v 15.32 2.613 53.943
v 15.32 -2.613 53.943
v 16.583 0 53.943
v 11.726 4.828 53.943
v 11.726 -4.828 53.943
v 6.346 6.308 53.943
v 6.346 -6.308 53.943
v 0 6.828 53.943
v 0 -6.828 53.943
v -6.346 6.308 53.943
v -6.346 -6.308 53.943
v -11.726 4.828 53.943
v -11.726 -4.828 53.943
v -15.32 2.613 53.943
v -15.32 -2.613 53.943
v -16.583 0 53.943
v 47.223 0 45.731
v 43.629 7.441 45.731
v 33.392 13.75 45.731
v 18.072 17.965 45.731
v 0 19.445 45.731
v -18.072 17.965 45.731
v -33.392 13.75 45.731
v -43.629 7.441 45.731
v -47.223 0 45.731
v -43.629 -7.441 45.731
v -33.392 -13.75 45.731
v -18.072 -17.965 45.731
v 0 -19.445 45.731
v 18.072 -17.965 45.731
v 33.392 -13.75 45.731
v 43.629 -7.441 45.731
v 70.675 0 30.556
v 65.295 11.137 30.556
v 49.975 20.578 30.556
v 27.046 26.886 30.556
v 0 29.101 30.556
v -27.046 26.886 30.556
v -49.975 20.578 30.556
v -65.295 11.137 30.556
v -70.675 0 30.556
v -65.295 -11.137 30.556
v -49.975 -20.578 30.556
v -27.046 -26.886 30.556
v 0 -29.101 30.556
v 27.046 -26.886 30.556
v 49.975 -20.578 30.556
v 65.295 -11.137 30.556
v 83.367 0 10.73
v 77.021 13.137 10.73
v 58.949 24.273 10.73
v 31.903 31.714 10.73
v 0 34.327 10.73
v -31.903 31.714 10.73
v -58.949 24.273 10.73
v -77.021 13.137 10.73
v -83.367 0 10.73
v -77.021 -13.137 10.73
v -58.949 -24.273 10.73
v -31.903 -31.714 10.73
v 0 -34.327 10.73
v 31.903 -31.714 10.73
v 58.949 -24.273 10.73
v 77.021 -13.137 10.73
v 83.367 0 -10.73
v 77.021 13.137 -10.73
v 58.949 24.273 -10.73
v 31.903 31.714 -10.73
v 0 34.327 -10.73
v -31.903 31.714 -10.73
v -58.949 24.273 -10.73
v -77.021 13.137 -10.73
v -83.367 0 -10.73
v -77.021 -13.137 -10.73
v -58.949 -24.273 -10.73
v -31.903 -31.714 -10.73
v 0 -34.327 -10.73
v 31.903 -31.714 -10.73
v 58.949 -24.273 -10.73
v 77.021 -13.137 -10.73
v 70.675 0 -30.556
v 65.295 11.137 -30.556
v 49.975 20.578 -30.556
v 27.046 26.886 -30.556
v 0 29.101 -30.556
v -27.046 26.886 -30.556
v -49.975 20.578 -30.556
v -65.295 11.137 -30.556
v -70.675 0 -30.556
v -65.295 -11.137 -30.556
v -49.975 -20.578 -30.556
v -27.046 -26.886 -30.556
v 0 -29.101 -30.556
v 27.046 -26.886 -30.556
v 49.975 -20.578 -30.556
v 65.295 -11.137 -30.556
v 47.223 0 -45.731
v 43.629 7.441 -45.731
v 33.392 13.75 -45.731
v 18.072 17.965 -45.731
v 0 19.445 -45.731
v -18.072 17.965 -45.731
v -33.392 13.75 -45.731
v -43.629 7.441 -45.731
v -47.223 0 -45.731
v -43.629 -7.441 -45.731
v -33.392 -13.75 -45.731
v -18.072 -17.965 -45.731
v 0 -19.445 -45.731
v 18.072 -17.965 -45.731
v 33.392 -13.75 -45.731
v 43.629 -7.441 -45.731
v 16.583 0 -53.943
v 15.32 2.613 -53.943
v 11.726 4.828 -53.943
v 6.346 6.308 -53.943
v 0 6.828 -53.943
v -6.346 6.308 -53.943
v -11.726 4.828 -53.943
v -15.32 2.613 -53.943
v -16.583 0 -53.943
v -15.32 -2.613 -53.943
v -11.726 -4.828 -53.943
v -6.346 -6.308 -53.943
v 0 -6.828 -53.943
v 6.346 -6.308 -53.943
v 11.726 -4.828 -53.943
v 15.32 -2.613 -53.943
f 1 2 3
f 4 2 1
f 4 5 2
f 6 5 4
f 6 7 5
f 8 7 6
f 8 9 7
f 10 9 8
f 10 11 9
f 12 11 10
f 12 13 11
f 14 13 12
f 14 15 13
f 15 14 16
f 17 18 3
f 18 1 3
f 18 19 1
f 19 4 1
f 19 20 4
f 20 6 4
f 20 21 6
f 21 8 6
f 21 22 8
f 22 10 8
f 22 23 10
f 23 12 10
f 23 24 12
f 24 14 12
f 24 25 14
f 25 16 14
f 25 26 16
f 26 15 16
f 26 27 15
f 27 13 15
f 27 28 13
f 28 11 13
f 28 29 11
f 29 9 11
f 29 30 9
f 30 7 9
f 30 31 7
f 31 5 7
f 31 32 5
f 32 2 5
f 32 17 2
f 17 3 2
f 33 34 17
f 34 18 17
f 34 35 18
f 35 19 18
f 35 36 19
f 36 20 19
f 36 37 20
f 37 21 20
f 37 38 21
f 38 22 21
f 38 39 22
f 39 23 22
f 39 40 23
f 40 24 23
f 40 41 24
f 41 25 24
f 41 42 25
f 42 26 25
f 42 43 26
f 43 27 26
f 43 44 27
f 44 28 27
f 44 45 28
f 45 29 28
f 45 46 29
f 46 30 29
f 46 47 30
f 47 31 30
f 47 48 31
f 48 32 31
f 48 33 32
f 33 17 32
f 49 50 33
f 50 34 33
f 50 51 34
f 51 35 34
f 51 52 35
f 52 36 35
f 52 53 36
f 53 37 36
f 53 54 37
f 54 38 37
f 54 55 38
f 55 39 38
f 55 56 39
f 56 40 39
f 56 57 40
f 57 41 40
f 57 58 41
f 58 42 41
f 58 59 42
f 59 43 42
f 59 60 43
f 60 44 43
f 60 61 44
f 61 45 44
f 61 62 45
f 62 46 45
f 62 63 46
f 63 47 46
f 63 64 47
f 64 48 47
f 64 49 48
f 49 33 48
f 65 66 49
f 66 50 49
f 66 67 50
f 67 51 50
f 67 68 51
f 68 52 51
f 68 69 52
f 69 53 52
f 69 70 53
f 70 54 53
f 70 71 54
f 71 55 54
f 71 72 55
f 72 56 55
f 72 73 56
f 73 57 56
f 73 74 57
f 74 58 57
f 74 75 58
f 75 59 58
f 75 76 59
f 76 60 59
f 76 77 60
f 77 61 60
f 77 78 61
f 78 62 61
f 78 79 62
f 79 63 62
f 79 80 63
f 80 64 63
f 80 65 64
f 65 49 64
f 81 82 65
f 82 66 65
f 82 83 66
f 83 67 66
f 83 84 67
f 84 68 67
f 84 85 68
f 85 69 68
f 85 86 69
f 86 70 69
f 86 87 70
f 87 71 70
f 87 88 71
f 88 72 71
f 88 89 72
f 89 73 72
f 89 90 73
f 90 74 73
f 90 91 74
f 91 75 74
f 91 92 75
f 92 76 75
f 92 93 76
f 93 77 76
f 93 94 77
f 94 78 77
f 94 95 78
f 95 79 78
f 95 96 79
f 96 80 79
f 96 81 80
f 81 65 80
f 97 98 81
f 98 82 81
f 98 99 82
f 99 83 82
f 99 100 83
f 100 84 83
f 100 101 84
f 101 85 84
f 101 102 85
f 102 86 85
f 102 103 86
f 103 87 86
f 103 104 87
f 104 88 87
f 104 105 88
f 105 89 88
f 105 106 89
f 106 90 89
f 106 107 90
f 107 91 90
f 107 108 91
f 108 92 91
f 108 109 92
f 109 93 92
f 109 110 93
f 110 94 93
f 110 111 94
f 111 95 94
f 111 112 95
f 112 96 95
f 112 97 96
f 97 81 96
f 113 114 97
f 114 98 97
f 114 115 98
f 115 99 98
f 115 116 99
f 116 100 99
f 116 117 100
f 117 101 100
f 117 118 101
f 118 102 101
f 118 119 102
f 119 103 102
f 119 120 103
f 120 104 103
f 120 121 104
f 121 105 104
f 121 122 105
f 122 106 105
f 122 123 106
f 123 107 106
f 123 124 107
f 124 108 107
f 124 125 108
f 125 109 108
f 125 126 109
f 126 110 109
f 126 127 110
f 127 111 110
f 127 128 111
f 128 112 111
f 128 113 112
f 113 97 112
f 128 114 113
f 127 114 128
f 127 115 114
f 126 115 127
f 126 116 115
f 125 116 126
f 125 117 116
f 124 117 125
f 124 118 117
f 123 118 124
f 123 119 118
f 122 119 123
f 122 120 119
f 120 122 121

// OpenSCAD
// Generated by SolidPython 1.0.1 on 2020-07-29 00:46:52


scale(v = [17, 7, 11]) {
	sphere(r = 5);
}
/***********************************************
*********      SolidPython code:      **********
************************************************
 
# import packages: SolidPython
from solid import *
from solid.utils import *
from itertools import chain, combinations, permutations


class Resize:

    def __init__(self, scad_file):
        self.scad_file = scad_file
        #self.scad_file = import_scad(scad_file)
        # cone/cylinder param:
        self.r1 = 0
        self.r2 = 0
        self.h = 0
        # rectangular prism param:
        self.w = 0
        self.l = 0
        # ellipse param:
        self.r = 0

    # import OpenScad code (file name corresponds to shape)


    # classify shape + parameters
    def assign(self, param1, param2, param3):
        if self.scad_file == 'cone.scad':
            self.r1 = param1
            self.r2 = param2
            self.h = param3
        elif self.scad_file == 'cylinder.scad':
            self.r1 = param1
            self.r2 = param2
            self.h = param3
        elif self.scad_file == 'rectangularPrism.scad':
            self.h = param1
            self.l = param2
            self.w = param3
        else:
            self.r = param1
            self.h = param2

    # resize parameters
    def iterate(self):
        x = range(3, 20, 2)
        i = 1
        if self.scad_file == 'cone.scad':
            tempList = list(permutations(x, 2))
            for temp in tempList:
                param1 = temp[0]
                param2 = temp[1]
                filepath = 'produced_scad_files/' + 'cone' + str(param1) + '_' + str(param2) + '_' + '.scad'
                scad_render_to_file(cylinder(h=param1, r1=param2, r2=0), filepath)

        elif self.scad_file == 'cylinder.scad':
            tempList = list(permutations(x, 3))
            for temp in tempList:
                param1 = temp[0]
                param2 = temp[1]
                filepath = 'produced_scad_files/' + 'cylinder' + str(param1) + '_' + str(param2) + '_' + '.scad'
                scad_render_to_file(cylinder(h=param1, r1=param2, r2=param2), filepath)

        elif self.scad_file == 'rectangularPrism.scad':
            tempList = list(permutations(x, 3))
            for temp in tempList:
                param1 = temp[0]
                param2 = temp[1]
                param3 = temp[2]
                filepath = 'produced_scad_files/' + 'rectangularPrism' + str(param1) + '_' + str(param2) + '_' + str(
                    param3) + '.scad'
                scad_render_to_file(cube(size=(param1, param2, param3)), filepath)

        elif self.scad_file == 'ellipse.scad':
            tempList = list(permutations(x, 4))
            for temp in tempList:
                param1 = temp[0]
                param2 = temp[1]
                param3 = temp[2]
                param4 = temp[3]
                filepath = 'produced_scad_files/' + 'ellipse' + str(param1) + '_' + str(param2) + '_' + str(param3) + '_' + str(param4) + '.scad'
                scad_render_to_file(scale([param1, param2, param3])(sphere(r=param4)), filepath)

    def render_to_scadfile(self):
        scad_render_to_file(scad, 'example.scad') 
 
************************************************/
